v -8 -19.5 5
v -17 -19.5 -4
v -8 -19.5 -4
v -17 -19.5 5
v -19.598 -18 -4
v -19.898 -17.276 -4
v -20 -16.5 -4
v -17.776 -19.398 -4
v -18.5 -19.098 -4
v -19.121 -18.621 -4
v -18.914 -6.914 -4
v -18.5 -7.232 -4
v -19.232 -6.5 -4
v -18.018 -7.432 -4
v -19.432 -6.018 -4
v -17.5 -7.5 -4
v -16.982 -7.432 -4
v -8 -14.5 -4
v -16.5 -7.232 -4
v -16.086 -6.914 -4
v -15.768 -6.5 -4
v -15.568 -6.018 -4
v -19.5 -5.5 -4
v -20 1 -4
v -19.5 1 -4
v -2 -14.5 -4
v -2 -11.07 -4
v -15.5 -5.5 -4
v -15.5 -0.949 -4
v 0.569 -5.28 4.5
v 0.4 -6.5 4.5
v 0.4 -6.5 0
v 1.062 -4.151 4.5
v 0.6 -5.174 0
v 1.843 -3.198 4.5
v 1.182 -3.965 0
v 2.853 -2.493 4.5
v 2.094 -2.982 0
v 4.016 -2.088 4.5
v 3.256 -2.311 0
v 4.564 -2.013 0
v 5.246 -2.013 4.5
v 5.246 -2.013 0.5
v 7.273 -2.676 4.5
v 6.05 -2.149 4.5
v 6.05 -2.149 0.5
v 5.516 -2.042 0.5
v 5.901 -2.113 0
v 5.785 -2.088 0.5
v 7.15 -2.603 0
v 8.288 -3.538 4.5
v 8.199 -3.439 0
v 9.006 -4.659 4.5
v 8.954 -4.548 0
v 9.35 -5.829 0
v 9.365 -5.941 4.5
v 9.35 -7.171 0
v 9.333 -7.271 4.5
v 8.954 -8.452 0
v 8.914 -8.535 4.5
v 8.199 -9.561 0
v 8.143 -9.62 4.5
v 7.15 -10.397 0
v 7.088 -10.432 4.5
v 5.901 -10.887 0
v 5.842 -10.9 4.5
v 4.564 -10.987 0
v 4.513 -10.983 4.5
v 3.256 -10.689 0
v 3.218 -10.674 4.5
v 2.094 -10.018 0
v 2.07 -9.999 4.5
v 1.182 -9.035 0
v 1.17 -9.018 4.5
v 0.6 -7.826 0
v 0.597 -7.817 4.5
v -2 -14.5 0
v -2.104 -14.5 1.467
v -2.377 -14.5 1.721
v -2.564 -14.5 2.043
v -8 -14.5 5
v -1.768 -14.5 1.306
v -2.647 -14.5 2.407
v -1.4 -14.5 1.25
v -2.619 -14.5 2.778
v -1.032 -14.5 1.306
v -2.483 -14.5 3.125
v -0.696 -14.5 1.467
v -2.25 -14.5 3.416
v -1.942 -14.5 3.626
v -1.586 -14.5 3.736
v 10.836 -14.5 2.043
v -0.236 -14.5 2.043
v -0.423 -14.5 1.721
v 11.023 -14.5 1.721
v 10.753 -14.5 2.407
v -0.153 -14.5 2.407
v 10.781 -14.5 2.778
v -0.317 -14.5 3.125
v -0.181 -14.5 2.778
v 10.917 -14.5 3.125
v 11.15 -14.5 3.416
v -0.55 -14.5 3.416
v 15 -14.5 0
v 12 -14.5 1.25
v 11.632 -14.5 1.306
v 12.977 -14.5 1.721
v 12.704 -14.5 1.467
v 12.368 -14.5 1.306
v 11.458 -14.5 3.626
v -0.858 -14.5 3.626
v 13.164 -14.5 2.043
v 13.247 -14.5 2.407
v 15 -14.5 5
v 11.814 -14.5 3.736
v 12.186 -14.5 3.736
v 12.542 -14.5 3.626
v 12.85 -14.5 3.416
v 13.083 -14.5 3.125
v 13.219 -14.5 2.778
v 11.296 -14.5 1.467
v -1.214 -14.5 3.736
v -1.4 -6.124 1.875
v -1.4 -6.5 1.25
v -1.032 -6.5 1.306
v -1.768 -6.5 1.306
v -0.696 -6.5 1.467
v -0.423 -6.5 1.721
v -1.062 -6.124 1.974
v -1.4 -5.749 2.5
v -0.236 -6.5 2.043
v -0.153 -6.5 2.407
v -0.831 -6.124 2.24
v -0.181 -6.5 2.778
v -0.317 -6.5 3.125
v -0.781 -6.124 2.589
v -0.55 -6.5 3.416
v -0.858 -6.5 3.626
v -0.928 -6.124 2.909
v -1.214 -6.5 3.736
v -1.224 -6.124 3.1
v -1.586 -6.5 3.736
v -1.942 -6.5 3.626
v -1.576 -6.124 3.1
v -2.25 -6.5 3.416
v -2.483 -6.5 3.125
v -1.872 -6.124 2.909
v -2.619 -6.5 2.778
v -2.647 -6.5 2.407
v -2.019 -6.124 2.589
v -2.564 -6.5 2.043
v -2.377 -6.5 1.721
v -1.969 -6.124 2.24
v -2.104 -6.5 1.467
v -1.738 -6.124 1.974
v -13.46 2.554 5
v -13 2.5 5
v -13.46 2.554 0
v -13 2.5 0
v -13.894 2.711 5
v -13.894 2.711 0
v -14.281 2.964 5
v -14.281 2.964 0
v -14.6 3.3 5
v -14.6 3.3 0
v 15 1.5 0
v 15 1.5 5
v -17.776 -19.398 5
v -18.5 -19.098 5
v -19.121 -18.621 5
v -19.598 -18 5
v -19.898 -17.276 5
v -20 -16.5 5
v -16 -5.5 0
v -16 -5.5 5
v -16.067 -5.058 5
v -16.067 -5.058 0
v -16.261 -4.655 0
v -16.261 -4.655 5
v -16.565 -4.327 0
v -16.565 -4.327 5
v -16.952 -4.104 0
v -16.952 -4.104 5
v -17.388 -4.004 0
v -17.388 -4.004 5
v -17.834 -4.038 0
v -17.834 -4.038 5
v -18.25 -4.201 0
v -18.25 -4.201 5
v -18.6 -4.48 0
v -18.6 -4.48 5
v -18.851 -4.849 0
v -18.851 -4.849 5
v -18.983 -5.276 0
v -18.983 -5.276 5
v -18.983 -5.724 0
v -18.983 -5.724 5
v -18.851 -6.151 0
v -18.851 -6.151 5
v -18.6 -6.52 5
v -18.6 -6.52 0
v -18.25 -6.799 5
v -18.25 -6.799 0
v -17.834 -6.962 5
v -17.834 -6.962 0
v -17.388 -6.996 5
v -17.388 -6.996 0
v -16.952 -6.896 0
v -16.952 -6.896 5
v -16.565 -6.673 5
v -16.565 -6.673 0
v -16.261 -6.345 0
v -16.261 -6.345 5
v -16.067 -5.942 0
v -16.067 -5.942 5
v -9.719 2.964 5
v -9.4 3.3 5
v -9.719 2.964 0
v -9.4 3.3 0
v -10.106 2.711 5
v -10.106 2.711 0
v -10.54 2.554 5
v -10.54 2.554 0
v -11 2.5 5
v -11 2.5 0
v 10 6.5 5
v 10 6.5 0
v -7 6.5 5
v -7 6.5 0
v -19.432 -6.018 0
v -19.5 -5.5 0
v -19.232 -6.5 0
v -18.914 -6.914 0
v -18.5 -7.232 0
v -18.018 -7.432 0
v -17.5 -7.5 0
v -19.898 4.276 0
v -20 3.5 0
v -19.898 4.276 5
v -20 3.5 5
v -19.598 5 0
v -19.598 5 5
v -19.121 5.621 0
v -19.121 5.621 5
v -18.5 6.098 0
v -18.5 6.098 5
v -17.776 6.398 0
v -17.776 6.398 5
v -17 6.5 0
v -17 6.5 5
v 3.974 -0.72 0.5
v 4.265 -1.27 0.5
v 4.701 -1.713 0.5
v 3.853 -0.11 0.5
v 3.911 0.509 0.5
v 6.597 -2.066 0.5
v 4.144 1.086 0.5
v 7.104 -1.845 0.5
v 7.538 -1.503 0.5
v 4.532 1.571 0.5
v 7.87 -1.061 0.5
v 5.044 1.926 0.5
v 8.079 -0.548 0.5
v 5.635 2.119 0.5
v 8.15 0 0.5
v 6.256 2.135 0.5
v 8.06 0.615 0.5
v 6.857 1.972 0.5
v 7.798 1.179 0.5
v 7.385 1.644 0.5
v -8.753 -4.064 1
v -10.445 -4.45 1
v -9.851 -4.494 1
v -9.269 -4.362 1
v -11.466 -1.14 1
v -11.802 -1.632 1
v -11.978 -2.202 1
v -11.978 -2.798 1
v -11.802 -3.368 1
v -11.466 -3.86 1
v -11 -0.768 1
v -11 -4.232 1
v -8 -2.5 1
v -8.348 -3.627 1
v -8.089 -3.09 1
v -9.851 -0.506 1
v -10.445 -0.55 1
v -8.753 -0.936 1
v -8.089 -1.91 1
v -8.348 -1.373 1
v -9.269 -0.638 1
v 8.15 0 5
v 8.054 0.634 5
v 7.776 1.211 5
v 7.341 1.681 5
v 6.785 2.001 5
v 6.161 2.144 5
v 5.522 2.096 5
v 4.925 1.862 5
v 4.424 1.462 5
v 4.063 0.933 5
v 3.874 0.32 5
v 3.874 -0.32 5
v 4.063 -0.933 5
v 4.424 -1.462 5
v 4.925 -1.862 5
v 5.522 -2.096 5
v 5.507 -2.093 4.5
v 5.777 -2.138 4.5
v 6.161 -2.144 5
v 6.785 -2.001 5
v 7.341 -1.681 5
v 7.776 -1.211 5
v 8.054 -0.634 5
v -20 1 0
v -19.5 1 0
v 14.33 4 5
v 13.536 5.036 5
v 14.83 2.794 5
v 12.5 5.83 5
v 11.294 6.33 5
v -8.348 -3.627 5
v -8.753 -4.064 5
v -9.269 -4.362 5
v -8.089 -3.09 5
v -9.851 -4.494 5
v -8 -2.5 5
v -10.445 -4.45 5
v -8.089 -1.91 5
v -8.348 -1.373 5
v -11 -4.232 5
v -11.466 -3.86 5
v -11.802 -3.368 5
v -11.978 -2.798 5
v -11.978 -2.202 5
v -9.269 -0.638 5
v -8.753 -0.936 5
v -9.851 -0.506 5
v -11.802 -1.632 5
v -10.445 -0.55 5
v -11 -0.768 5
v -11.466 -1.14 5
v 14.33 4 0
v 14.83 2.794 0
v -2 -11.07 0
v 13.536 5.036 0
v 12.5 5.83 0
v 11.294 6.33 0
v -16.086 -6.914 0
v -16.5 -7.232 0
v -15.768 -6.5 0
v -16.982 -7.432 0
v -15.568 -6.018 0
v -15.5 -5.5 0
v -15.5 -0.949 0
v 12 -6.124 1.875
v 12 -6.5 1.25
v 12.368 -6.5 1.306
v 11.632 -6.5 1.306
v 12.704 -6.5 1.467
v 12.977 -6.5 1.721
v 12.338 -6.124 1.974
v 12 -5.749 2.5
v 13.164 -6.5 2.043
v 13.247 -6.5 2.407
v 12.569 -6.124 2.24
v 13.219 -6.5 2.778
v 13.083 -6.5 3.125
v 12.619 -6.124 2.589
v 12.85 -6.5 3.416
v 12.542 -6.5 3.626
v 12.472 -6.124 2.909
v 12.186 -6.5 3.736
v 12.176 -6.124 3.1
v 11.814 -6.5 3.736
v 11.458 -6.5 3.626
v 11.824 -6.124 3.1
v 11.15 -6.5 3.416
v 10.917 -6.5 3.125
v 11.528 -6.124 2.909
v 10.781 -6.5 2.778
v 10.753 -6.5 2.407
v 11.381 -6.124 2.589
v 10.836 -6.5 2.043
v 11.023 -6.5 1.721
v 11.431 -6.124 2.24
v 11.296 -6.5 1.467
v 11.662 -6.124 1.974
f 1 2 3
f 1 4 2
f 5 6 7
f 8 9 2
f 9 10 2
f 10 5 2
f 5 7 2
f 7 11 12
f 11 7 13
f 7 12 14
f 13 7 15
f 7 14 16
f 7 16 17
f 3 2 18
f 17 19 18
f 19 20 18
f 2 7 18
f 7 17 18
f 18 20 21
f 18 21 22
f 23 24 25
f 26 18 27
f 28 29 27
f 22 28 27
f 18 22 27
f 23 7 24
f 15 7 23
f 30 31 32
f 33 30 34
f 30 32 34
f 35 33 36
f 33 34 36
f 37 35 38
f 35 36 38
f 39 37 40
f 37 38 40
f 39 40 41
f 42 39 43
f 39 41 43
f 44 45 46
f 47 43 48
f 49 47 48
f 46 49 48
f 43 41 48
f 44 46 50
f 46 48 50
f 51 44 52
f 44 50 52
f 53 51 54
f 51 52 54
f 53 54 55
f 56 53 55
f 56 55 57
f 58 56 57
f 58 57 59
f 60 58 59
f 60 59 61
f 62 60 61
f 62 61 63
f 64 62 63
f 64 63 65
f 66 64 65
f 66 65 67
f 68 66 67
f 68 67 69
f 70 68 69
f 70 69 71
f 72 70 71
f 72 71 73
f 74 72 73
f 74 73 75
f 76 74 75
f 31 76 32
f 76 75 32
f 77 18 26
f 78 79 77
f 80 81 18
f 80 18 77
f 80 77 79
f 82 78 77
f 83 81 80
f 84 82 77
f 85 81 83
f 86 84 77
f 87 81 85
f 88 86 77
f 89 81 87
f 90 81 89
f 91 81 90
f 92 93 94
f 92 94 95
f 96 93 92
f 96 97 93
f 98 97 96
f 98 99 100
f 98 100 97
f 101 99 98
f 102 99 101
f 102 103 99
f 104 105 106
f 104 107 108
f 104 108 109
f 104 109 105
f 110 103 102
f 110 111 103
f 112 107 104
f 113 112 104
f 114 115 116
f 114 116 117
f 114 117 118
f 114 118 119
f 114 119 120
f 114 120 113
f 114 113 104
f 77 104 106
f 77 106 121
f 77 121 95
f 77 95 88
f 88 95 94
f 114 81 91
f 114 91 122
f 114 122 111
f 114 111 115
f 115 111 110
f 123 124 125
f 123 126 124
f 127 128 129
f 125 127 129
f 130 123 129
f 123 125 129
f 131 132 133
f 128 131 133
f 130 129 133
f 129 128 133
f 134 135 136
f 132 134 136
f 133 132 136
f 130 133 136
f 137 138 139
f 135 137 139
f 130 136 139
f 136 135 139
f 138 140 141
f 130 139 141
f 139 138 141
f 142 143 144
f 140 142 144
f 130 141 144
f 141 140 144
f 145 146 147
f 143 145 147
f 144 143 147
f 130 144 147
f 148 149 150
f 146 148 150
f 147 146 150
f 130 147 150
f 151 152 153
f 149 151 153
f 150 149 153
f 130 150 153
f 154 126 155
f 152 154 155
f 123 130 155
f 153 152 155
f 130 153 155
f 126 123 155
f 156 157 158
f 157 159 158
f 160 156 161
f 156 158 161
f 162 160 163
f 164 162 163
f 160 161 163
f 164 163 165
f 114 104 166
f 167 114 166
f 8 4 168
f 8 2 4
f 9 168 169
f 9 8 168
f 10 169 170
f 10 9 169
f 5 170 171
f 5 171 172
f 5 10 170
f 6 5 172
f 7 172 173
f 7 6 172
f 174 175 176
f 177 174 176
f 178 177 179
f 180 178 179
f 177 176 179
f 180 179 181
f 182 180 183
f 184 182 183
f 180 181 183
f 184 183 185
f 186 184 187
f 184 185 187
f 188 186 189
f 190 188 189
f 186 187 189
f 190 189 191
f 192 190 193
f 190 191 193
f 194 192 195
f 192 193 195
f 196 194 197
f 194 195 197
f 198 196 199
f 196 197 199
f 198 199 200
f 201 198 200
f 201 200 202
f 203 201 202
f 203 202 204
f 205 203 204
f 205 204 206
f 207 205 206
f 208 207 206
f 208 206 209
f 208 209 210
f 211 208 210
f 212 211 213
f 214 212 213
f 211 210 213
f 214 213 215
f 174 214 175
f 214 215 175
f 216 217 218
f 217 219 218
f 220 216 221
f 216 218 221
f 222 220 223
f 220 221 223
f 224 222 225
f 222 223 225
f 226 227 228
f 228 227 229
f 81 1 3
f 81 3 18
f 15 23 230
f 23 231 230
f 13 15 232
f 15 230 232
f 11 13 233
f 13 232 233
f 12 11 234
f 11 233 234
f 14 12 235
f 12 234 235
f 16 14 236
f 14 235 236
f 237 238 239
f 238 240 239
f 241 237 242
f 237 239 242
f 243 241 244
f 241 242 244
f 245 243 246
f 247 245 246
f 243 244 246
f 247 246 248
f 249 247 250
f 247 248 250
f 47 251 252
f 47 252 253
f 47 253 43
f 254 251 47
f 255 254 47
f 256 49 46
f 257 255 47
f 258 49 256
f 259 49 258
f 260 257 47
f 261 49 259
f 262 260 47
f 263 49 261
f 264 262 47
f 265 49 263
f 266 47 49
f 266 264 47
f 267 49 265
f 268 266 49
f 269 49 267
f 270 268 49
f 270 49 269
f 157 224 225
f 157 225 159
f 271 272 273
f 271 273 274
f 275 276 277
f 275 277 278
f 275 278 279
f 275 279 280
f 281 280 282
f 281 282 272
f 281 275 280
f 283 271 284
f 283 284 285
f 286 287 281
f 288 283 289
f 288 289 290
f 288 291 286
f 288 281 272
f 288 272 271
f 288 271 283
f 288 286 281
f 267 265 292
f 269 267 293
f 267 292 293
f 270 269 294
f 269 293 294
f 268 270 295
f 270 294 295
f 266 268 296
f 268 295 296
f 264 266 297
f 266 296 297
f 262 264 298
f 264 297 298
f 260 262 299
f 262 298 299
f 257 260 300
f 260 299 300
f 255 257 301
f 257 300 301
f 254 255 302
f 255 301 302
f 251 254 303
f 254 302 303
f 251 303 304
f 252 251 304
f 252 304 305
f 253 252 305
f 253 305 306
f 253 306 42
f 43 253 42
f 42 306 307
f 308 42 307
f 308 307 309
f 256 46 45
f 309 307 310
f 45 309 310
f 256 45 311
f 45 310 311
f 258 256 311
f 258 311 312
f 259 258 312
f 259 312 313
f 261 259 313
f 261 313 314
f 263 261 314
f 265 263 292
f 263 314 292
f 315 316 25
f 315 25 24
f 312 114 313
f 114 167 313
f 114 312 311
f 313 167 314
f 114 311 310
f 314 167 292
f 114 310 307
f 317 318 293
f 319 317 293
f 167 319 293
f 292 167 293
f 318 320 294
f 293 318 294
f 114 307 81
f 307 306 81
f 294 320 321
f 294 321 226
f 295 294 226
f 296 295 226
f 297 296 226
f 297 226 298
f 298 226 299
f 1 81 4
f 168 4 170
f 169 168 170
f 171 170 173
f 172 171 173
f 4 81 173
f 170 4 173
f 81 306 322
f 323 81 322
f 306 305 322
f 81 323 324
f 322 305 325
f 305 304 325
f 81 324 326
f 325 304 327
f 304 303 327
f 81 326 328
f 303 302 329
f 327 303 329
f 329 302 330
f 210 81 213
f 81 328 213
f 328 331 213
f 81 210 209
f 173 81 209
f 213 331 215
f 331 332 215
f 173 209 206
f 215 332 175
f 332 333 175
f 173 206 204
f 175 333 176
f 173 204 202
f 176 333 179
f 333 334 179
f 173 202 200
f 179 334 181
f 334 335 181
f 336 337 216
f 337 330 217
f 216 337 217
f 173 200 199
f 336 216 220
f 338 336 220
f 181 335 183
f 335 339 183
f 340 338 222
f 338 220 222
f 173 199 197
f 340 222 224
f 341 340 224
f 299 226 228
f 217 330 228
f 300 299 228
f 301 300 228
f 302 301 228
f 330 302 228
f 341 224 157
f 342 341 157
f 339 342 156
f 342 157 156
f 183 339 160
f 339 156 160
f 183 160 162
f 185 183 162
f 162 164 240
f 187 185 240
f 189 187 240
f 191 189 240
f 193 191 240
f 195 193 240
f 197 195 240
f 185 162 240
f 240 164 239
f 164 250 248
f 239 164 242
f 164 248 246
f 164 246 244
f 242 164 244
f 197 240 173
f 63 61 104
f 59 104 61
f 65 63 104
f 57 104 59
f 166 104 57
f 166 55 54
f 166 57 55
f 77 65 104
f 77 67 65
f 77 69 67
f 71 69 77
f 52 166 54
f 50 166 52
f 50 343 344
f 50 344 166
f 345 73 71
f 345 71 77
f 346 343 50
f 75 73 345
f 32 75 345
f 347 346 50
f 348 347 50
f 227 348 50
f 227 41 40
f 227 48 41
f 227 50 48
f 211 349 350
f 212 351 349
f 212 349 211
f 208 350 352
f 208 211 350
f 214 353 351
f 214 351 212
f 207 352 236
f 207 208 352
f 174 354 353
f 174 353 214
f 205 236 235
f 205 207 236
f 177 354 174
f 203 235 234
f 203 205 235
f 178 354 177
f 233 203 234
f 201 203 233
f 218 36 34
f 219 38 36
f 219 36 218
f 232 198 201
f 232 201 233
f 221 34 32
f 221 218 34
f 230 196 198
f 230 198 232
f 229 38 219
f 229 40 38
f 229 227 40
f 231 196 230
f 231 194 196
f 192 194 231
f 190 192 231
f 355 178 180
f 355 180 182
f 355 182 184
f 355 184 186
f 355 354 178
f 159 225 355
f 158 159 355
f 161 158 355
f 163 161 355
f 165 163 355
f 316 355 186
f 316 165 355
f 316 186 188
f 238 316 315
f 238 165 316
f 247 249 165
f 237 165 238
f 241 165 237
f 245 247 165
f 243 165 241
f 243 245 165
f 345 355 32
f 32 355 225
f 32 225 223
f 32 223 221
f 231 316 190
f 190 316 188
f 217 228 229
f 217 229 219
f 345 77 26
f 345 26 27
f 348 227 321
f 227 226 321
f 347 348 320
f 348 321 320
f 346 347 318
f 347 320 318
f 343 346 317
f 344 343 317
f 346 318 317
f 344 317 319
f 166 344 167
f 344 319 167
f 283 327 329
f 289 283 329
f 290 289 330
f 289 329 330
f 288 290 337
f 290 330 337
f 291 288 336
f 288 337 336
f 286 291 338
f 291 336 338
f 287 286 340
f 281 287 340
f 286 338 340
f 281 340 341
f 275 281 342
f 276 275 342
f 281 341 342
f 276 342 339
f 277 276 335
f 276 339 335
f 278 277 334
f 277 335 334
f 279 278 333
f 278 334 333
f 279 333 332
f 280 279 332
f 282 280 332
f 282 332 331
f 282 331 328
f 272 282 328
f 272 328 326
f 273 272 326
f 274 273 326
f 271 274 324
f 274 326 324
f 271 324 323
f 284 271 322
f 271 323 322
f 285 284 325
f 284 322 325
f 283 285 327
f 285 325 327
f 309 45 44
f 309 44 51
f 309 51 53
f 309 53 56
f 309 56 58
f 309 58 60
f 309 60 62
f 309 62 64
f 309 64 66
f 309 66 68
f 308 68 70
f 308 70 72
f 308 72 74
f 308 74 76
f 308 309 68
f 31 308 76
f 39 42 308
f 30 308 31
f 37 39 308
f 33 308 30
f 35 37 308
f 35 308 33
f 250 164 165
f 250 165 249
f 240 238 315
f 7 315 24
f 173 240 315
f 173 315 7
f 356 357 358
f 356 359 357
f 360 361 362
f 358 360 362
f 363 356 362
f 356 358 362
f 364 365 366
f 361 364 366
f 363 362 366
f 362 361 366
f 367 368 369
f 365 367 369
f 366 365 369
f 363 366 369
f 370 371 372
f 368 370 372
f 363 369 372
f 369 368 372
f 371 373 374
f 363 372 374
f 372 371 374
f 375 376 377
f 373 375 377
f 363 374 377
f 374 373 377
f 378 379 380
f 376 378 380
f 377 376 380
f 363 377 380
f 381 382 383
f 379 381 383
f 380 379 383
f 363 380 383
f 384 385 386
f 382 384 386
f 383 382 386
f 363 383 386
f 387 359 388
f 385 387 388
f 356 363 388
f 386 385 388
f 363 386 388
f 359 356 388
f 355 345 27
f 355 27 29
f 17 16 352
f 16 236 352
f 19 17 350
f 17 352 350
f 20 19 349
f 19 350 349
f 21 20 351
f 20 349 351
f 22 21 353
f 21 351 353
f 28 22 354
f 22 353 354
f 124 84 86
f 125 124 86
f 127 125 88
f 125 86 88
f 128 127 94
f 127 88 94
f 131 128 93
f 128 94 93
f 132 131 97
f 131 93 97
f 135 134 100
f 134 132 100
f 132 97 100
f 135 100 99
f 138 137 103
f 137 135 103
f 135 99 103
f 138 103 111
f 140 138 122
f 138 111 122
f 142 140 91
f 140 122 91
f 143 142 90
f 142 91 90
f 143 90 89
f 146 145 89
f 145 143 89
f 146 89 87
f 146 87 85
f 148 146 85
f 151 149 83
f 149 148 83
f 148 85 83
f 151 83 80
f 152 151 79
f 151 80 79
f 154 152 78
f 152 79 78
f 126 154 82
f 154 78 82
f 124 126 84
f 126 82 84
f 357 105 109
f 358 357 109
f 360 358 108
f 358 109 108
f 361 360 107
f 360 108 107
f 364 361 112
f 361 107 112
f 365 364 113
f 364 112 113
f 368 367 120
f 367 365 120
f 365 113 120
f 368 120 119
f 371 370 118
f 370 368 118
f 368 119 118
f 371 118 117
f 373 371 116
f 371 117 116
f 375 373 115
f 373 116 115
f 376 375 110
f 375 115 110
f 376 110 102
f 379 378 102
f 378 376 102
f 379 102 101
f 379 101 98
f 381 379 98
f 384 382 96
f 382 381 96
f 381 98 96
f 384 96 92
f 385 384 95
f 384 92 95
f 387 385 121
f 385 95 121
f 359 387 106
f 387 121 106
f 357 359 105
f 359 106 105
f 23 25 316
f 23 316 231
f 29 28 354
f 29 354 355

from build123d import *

# Parameters (mm, degrees)
SKETCH1_W             = 23
SKETCH1_H             = 21
EXTRUDE1_DEPTH        = 5
SKETCH2_R             = 2.15
EXTRUDE2_DEPTH        = 4.5
SKETCH4_R             = 1.25
EXTRUDE4_DEPTH        = 8
FILLET1_R             = 5
SKETCH6_R             = 4.5
EXTRUDE6_DEPTH        = 4.5
SKETCH9_W             = 12
SKETCH9_H             = 26
EXTRUDE9_DEPTH        = 5
SKETCH11_R            = 1.5
EXTRUDE11_DEPTH       = 5
SKETCH10_R            = 2
EXTRUDE10_DEPTH       = 4
M3_TAPPED_HOLE1_D     = 2.5
M3_TAPPED_HOLE1_DEPTH = 8
M3_TAPPED_HOLE1_TIP   = 0.751075774
EXTRUDE12_DEPTH       = 4
FILLET3_R             = 3
EXTRUDE14_DEPTH       = 4
FILLET4_R             = 2
EXTRUDE15_DEPTH       = 5
FILLET6_R             = 2


with BuildPart() as part:
    # Sketch1 → Extrude1 (new body)
    with BuildSketch(Plane.XY):
        with Locations((3.5, -4)):
            Rectangle(SKETCH1_W, SKETCH1_H)
    extrude(amount=EXTRUDE1_DEPTH)

    # Sketch2 → Extrude2 (cut)
    with BuildSketch(Plane.XY.offset(5)):
        with Locations((6, 0)):
            Circle(SKETCH2_R)
    extrude(amount=-EXTRUDE2_DEPTH, mode=Mode.SUBTRACT)

    # Sketch4 → Extrude4 (cut)
    with BuildSketch(Plane.XZ.offset(14.5)):
        with Locations(Location((-1.4, 2.5, 0), (0, 0, 270))):
            Circle(SKETCH4_R)
        with Locations(Location((12, 2.5, 0), (0, 0, 270))):
            Circle(SKETCH4_R)
    extrude(amount=-EXTRUDE4_DEPTH, mode=Mode.SUBTRACT)

    # Fillet1
    fillet1_edges = [part.edges().sort_by_distance(p)[0] for p in [
        (15, 6.5, 2.5),
    ]]
    fillet(fillet1_edges, radius=FILLET1_R)

    # Sketch6 → Extrude6 (cut)
    with BuildSketch(Plane(origin=(0, 0, 0), x_dir=(-1, 0, 0), z_dir=(0, 0, -1))):
        with Locations((-4.9, -6.5)):
            Circle(SKETCH6_R)
    extrude(amount=-EXTRUDE6_DEPTH, mode=Mode.SUBTRACT)

    # Sketch9 → Extrude9 (add)
    with BuildSketch(Plane(origin=(0, 0, 0), x_dir=(-1, 0, 0), z_dir=(0, 0, -1))):
        with Locations((14, -6.5)):
            Rectangle(SKETCH9_W, SKETCH9_H)
    extrude(amount=-EXTRUDE9_DEPTH)

    # Sketch11 → Extrude11 (cut)
    with BuildSketch(Plane.XY.offset(5)):
        with Locations((-17.5, -5.5)):
            Circle(SKETCH11_R)
    extrude(amount=-EXTRUDE11_DEPTH, mode=Mode.SUBTRACT)

    # Sketch10 → Extrude10 (cut)
    with BuildSketch(Plane.XY.offset(5)):
        with Locations((-10, -2.5)):
            Circle(SKETCH10_R)
    extrude(amount=-EXTRUDE10_DEPTH, mode=Mode.SUBTRACT)

    # M3 Tapped Hole1
    with Locations(Plane(origin=(-1.4, -14.5, 2.5), x_dir=(0, 0, -1), z_dir=(0, -1, 0))):
        with Locations((0, 0), (0, 13.4)):
            Hole(M3_TAPPED_HOLE1_D / 2, depth=M3_TAPPED_HOLE1_DEPTH)
            with Locations((0, 0, -(M3_TAPPED_HOLE1_DEPTH + M3_TAPPED_HOLE1_TIP / 2))):  # 118° drill point
                Cone(0, M3_TAPPED_HOLE1_D / 2, M3_TAPPED_HOLE1_TIP, mode=Mode.SUBTRACT)

    # Sketch13 → Extrude12 (add)
    with BuildSketch(Plane(origin=(0, 0, 0), x_dir=(-1, 0, 0), z_dir=(0, 0, -1))):
        Polygon((20, -19.5), (8, -19.5), (8, -14.5), (2, -14.5), (2, -11.07), (18.1, 1), (20, 1), align=None)
    extrude(amount=EXTRUDE12_DEPTH)

    # Fillet3
    fillet3_edges = [part.edges().sort_by_distance(p)[0] for p in [
        (-20, -19.5, 0.5),
        (-20, 6.5, 2.5),
    ]]
    fillet(fillet3_edges, radius=FILLET3_R)

    # Sketch14 → Extrude14 (cut)
    with BuildSketch(Plane(origin=(0, 0, -4), x_dir=(-1, 0, 0), z_dir=(0, 0, -1))):
        Polygon((19.5, 1), (19.5, -7.5), (15.5, -7.5), (15.5, -0.949192547), (18.1, 1), align=None)
    extrude(amount=-EXTRUDE14_DEPTH, mode=Mode.SUBTRACT)

    # Fillet4
    fillet4_edges = [part.edges().sort_by_distance(p)[0] for p in [
        (-19.5, -7.5, -2),
        (-15.5, -7.5, -2),
    ]]
    fillet(fillet4_edges, radius=FILLET4_R - 0.0001)  # a hair under: the kernel refuses the full size

    # Sketch15 → Extrude15 (cut)
    with BuildSketch(Plane.XY.offset(5)):
        Polygon((-14, 2.5), (-17, 6.5), (-7, 6.5), (-10, 2.5), align=None)
    extrude(amount=-EXTRUDE15_DEPTH, mode=Mode.SUBTRACT)

    # Fillet6
    fillet6_edges = [part.edges().sort_by_distance(p)[0] for p in [
        (-10, 2.5, 2.5),
        (-14, 2.5, 2.5),
    ]]
    fillet(fillet6_edges, radius=FILLET6_R)


solid = part.part
